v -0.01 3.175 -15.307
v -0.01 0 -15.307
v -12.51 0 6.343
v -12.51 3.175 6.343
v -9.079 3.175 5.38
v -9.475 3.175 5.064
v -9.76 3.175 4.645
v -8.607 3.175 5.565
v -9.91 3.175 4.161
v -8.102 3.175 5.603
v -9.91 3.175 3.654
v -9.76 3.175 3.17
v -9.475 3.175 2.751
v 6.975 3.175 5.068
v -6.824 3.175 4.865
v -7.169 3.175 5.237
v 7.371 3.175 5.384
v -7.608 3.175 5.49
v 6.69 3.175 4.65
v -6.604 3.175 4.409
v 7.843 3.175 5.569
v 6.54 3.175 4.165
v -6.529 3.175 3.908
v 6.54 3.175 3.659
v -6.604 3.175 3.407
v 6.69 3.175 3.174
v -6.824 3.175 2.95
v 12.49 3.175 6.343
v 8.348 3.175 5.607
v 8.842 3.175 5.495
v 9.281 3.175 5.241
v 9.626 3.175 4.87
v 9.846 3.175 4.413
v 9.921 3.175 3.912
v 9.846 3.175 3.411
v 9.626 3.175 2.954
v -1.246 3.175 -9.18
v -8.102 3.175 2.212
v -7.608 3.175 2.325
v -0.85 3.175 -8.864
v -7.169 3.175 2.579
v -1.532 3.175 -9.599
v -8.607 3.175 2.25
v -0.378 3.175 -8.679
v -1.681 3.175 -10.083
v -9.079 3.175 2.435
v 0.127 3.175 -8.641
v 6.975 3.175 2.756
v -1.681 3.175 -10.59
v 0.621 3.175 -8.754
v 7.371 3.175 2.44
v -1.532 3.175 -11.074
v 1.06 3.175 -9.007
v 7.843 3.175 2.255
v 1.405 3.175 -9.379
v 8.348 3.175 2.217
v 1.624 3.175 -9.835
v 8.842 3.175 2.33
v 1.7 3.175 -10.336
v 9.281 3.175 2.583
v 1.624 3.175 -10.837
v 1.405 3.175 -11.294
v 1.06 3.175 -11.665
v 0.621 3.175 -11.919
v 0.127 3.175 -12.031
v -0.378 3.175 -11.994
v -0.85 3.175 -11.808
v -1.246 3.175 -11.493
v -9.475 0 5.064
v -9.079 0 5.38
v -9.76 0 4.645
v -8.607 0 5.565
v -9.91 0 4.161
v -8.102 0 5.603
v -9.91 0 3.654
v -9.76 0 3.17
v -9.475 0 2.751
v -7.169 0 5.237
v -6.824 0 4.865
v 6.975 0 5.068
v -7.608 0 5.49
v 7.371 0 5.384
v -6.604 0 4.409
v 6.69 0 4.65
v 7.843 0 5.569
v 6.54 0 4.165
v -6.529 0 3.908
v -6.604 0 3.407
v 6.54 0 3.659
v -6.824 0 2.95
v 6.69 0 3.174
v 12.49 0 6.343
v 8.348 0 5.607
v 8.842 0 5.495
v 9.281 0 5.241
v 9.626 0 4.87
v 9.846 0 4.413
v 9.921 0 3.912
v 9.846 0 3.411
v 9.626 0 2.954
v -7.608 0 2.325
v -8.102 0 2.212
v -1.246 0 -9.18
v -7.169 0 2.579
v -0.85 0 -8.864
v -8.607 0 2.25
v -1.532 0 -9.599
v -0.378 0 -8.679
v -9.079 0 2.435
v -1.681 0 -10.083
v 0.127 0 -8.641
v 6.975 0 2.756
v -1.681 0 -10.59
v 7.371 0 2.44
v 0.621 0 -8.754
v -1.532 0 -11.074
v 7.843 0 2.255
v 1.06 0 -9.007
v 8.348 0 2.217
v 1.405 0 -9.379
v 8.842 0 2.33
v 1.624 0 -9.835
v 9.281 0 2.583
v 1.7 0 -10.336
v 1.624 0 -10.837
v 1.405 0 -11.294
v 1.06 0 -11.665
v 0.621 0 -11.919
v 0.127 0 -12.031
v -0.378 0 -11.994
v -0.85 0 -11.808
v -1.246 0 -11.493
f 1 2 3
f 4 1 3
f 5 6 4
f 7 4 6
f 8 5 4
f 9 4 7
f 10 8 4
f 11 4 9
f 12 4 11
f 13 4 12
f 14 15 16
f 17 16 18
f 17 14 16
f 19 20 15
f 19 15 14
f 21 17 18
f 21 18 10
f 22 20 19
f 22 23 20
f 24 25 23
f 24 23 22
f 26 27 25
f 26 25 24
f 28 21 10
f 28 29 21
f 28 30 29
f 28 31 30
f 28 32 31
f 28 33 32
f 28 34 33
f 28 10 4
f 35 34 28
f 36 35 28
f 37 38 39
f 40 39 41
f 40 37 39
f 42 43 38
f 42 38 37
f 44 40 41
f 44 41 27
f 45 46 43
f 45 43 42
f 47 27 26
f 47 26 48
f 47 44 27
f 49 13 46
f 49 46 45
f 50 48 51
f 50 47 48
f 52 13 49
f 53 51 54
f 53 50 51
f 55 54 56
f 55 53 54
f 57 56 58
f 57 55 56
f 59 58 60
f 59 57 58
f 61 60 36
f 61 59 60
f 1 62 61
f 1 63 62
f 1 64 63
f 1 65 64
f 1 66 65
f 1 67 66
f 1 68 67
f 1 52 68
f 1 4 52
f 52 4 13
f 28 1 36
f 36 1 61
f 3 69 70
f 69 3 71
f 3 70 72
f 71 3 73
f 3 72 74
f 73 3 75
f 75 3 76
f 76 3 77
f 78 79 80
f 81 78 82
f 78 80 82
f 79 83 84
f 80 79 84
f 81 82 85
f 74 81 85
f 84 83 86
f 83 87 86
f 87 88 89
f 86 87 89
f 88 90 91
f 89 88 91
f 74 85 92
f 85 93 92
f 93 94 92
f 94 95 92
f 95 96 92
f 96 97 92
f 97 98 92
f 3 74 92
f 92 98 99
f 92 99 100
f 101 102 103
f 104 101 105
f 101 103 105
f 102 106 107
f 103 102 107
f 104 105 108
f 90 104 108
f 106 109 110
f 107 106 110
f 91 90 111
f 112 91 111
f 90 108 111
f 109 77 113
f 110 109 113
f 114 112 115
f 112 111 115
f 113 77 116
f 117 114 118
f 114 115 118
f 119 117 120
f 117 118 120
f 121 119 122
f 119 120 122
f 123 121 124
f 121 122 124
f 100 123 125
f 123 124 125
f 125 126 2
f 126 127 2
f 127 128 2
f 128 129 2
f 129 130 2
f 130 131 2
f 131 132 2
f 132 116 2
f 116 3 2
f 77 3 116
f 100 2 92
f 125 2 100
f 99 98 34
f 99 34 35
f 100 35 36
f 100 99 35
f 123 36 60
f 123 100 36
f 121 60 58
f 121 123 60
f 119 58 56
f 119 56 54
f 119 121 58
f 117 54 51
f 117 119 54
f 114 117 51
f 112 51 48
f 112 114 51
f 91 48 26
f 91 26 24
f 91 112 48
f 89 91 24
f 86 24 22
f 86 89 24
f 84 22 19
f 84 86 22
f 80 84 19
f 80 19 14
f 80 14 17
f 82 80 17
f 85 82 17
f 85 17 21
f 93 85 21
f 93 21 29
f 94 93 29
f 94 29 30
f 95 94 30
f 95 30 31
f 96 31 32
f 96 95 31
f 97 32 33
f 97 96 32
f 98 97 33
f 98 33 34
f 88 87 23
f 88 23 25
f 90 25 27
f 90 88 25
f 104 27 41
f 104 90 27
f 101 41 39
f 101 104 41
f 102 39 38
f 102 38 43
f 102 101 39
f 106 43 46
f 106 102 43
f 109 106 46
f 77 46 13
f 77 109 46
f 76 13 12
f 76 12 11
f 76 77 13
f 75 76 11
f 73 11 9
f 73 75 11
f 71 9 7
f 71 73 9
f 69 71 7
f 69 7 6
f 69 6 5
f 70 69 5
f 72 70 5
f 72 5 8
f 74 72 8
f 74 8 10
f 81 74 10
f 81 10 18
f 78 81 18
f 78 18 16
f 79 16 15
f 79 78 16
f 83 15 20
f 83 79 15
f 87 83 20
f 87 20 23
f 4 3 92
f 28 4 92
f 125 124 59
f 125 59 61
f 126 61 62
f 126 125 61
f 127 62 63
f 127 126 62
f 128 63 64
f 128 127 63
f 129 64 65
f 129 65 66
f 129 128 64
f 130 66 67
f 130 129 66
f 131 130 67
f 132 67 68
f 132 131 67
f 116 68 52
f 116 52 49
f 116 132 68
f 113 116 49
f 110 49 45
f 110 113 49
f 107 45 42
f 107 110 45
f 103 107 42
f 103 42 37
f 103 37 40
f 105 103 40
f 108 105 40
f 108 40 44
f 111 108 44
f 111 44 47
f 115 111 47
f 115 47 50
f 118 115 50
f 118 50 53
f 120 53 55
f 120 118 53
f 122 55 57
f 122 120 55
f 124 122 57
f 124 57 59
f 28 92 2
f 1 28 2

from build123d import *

# Parameters (mm, degrees)
BOSS_EXTRUDE1_DEPTH = 3.175
HOLE1_OUTLINE_R     = 1.7
HOLE1_DEPTH         = 3.175


# Read off the part's stored shape, not the designer's step: Hole1
with BuildPart() as part:
    # Sketch1 → Boss-Extrude1 (new body)
    with BuildSketch(Plane(origin=(0, 0, 0), x_dir=(1, 0, 0), z_dir=(0, 1, 0))):
        Polygon((-0.009590706, 15.307381957), (-12.509590706, -6.343253138), (12.490409294, -6.343253138), align=None)
    extrude(amount=BOSS_EXTRUDE1_DEPTH)

    # Hole1 outline → Hole1 (cut)
    with BuildSketch(Plane(origin=(0, 0, 0), x_dir=(1, 0, 0), z_dir=(0, 1, 0))):
        with Locations((8.221235052, -3.912057057)):
            Circle(HOLE1_OUTLINE_R)
        with Locations((-8.228764373, -3.907710002)):
            Circle(HOLE1_OUTLINE_R)
        with Locations((0, 10.336233865)):
            Circle(HOLE1_OUTLINE_R)
    extrude(amount=HOLE1_DEPTH, mode=Mode.SUBTRACT)


solid = part.part
